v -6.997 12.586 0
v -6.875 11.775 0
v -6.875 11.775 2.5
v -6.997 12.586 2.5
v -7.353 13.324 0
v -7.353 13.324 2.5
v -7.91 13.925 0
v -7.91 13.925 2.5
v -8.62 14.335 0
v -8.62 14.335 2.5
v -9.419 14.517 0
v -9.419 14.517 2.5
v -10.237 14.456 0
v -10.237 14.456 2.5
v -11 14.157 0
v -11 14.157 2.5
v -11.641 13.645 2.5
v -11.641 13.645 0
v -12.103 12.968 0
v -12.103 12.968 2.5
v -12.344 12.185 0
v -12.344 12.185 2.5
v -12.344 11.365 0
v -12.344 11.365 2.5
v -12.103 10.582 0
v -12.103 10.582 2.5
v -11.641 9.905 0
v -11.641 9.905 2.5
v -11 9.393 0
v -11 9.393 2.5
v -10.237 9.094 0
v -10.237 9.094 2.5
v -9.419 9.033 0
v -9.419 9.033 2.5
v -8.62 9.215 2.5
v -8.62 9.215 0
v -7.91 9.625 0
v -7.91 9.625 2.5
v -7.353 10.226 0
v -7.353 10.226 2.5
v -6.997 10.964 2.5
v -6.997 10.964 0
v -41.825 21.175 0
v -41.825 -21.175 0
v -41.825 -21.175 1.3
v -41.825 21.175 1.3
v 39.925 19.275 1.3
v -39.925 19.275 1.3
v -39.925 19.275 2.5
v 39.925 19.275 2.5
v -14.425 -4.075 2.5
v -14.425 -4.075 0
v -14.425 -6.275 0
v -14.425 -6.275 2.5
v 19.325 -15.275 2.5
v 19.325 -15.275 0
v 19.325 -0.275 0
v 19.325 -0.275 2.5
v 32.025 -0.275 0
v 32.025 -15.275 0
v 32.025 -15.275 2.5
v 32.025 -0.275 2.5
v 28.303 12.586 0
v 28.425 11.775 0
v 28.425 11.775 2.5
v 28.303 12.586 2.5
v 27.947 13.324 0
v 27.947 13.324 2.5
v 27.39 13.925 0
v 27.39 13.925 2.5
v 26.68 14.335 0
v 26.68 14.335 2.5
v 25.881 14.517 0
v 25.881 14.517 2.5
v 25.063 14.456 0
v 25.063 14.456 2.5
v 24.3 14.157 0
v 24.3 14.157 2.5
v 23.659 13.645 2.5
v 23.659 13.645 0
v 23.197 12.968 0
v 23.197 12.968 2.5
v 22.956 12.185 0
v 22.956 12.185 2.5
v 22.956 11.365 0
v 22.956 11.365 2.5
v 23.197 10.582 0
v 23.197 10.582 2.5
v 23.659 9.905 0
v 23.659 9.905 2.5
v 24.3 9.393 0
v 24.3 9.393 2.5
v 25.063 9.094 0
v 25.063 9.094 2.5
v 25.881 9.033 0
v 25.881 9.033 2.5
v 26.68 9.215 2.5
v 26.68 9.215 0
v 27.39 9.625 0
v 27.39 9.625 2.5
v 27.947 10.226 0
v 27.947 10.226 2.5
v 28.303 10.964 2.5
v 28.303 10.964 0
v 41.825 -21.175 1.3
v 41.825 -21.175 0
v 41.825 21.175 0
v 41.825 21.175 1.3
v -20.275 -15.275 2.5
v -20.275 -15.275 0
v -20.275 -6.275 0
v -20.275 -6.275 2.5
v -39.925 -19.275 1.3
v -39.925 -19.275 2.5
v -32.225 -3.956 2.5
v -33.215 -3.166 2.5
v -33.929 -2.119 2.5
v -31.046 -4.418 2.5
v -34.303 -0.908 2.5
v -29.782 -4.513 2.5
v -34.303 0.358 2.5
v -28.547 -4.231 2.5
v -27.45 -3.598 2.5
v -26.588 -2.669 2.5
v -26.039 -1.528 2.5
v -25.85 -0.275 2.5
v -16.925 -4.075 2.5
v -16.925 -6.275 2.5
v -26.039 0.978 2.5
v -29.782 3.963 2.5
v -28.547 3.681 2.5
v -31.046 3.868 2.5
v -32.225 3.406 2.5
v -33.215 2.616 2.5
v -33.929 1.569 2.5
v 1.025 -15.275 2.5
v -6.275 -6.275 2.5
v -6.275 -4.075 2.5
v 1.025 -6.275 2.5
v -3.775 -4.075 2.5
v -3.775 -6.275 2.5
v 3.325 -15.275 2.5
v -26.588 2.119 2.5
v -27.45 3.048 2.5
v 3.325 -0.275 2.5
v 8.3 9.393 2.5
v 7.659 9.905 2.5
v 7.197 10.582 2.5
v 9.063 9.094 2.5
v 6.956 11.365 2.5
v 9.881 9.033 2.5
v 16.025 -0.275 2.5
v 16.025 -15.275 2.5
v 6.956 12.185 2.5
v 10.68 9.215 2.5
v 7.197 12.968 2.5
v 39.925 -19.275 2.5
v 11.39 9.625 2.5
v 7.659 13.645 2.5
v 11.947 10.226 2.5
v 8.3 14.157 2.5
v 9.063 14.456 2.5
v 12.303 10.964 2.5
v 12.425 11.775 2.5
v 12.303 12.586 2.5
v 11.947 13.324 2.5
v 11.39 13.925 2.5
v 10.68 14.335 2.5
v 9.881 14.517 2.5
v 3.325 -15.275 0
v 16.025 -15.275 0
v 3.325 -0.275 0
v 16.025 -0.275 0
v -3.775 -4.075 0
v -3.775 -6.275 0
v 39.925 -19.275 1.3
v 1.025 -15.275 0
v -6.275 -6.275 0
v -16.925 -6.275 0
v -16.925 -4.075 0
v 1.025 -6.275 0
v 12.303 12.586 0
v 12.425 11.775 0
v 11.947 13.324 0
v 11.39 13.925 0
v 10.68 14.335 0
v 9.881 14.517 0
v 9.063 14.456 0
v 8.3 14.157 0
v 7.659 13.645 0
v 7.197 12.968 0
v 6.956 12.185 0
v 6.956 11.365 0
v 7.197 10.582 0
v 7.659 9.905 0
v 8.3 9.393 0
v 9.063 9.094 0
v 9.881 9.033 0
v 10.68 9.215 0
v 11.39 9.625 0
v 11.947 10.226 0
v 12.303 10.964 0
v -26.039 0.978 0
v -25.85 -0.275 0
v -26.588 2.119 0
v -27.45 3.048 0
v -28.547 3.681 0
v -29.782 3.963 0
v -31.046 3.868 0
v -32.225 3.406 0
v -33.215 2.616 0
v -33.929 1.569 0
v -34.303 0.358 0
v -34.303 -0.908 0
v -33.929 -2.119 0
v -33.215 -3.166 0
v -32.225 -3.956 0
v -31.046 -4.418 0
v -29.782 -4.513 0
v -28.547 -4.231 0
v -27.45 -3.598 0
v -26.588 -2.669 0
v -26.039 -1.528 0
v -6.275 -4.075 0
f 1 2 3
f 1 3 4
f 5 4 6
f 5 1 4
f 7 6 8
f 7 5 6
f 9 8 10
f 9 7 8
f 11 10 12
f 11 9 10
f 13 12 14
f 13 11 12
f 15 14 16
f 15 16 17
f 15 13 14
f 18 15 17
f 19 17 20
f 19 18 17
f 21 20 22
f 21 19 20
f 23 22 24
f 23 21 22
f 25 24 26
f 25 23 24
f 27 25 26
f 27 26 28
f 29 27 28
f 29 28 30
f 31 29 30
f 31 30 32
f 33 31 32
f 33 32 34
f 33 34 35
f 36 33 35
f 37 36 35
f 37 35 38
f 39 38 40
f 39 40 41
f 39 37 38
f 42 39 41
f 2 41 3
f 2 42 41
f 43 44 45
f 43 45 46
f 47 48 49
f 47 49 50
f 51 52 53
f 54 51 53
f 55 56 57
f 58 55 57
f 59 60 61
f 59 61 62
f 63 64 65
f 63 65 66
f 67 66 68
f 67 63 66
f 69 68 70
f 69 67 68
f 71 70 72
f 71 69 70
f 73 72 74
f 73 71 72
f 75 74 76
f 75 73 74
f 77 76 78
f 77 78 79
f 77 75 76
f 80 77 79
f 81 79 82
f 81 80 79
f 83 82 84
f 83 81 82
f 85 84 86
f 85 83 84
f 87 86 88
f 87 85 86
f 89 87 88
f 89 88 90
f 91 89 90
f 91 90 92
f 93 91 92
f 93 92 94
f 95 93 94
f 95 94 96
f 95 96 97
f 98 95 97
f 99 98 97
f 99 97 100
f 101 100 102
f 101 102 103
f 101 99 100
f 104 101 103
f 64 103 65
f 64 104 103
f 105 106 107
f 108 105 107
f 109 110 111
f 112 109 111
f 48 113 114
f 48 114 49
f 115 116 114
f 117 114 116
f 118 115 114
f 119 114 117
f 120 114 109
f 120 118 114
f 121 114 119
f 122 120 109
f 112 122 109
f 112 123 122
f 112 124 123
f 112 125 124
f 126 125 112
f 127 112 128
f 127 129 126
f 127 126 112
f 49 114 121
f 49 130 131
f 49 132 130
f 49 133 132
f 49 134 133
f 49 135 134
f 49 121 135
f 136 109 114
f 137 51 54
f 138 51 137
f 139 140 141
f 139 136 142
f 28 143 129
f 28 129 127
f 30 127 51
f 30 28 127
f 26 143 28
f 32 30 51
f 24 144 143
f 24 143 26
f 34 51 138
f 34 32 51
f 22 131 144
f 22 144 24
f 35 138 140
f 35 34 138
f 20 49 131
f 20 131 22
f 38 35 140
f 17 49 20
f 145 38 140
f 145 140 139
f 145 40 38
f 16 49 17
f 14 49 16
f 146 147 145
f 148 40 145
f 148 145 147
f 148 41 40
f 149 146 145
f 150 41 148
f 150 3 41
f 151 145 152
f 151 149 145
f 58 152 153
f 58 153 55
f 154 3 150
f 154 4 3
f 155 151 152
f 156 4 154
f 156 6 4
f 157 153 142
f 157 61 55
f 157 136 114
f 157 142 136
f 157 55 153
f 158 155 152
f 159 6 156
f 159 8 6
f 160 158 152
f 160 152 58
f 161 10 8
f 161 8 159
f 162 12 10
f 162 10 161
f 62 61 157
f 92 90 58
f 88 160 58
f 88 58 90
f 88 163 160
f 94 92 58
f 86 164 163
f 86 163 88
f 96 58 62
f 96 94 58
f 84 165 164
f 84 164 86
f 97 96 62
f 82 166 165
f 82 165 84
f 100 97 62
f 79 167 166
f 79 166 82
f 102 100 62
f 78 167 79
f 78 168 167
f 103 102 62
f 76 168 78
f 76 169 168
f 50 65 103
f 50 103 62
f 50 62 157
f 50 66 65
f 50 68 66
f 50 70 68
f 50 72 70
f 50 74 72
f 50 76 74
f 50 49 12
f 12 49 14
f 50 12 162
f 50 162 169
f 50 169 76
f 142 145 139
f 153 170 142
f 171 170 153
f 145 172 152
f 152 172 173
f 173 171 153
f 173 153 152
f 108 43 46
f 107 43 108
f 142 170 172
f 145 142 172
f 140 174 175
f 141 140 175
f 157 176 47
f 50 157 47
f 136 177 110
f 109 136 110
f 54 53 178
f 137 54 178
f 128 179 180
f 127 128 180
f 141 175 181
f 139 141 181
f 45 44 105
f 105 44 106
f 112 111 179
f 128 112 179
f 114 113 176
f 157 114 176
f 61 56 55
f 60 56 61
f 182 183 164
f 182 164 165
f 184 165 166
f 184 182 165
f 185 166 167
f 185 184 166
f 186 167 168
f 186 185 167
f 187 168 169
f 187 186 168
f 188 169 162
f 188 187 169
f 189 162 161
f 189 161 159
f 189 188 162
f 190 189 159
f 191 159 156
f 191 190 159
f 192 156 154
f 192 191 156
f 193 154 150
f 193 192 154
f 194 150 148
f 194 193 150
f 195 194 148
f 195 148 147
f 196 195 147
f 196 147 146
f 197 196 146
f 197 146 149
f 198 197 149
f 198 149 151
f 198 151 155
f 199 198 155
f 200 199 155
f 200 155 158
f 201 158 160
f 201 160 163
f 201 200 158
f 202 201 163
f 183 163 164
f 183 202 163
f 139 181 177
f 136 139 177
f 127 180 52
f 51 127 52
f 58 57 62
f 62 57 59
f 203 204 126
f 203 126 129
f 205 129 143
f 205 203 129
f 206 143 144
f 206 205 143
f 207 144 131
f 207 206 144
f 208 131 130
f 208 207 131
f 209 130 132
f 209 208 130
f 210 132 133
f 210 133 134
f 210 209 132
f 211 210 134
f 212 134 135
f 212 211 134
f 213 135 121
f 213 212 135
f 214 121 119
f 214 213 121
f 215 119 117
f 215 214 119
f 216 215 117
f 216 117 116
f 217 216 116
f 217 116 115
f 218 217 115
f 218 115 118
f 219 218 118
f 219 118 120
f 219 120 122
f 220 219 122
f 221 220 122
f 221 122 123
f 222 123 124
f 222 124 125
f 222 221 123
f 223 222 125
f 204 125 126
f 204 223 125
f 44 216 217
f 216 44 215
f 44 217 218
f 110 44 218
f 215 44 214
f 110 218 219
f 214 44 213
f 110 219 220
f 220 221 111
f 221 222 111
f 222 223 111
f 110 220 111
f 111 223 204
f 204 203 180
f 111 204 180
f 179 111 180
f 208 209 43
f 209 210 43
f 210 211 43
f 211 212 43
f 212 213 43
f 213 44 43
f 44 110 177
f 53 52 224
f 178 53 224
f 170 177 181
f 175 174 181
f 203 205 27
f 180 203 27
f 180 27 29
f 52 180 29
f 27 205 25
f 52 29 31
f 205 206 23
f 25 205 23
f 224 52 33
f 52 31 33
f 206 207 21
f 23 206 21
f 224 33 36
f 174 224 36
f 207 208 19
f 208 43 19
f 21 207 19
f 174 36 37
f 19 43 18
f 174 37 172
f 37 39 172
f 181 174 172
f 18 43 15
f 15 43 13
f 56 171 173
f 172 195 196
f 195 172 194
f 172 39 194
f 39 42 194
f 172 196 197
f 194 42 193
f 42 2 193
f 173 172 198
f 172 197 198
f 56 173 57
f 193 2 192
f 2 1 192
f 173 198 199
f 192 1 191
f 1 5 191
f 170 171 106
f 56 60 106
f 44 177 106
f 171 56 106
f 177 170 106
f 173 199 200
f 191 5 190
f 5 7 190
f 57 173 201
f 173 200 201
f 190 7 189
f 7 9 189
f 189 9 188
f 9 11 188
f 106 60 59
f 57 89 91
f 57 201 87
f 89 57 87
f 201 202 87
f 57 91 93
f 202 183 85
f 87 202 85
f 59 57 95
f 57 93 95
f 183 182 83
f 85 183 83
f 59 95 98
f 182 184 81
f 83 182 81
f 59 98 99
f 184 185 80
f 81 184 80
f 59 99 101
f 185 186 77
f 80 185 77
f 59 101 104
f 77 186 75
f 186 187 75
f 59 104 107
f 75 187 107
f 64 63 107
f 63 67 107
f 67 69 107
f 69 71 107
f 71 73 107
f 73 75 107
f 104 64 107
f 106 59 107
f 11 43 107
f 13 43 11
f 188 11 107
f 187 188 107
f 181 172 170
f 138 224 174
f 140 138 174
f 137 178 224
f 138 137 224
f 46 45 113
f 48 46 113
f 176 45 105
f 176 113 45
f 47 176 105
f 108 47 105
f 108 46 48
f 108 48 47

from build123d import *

# Parameters (mm, degrees)
F0_W     = 79.85
F0_H     = 38.55
F0_R     = 4.25
F0_W_2   = 12.7
F0_H_2   = 15
F0_R_2   = 2.75
F1_DEPTH = 2.5
F0_W_3   = 83.65
F0_H_3   = 42.35
F2_DEPTH = 1.3


with BuildPart() as f1:
    # F0 (on Top) → F1 (new body)
    with BuildSketch(Plane.XY):
        Rectangle(F0_W, F0_H)
        with Locations((-30.1, -0.275)):
            Circle(F0_R, mode=Mode.SUBTRACT)
        Polygon((1.025, -6.275), (1.025, -15.275), (-20.275, -15.275), (-20.275, -6.275), (-16.925, -6.275), (-16.925, -4.075), (-14.425, -4.075), (-14.425, -6.275), (-6.275, -6.275), (-6.275, -4.075), (-3.775, -4.075), (-3.775, -6.275), align=None, mode=Mode.SUBTRACT)
        with Locations((9.675, -7.775)):
            Rectangle(F0_W_2, F0_H_2, mode=Mode.SUBTRACT)
        with Locations((25.675, -7.775)):
            Rectangle(F0_W_2, F0_H_2, mode=Mode.SUBTRACT)
        with Locations((-9.625, 11.775)):
            Circle(F0_R_2, mode=Mode.SUBTRACT)
        with Locations((9.675, 11.775)):
            Circle(F0_R_2, mode=Mode.SUBTRACT)
        with Locations((25.675, 11.775)):
            Circle(F0_R_2, mode=Mode.SUBTRACT)
    extrude(amount=F1_DEPTH)

    # F0 (on Top) → F2 (join)
    with BuildSketch(Plane.XY):
        Rectangle(F0_W_3, F0_H_3)
        Rectangle(F0_W, F0_H, mode=Mode.SUBTRACT)
    extrude(amount=F2_DEPTH)


solid = f1.part
